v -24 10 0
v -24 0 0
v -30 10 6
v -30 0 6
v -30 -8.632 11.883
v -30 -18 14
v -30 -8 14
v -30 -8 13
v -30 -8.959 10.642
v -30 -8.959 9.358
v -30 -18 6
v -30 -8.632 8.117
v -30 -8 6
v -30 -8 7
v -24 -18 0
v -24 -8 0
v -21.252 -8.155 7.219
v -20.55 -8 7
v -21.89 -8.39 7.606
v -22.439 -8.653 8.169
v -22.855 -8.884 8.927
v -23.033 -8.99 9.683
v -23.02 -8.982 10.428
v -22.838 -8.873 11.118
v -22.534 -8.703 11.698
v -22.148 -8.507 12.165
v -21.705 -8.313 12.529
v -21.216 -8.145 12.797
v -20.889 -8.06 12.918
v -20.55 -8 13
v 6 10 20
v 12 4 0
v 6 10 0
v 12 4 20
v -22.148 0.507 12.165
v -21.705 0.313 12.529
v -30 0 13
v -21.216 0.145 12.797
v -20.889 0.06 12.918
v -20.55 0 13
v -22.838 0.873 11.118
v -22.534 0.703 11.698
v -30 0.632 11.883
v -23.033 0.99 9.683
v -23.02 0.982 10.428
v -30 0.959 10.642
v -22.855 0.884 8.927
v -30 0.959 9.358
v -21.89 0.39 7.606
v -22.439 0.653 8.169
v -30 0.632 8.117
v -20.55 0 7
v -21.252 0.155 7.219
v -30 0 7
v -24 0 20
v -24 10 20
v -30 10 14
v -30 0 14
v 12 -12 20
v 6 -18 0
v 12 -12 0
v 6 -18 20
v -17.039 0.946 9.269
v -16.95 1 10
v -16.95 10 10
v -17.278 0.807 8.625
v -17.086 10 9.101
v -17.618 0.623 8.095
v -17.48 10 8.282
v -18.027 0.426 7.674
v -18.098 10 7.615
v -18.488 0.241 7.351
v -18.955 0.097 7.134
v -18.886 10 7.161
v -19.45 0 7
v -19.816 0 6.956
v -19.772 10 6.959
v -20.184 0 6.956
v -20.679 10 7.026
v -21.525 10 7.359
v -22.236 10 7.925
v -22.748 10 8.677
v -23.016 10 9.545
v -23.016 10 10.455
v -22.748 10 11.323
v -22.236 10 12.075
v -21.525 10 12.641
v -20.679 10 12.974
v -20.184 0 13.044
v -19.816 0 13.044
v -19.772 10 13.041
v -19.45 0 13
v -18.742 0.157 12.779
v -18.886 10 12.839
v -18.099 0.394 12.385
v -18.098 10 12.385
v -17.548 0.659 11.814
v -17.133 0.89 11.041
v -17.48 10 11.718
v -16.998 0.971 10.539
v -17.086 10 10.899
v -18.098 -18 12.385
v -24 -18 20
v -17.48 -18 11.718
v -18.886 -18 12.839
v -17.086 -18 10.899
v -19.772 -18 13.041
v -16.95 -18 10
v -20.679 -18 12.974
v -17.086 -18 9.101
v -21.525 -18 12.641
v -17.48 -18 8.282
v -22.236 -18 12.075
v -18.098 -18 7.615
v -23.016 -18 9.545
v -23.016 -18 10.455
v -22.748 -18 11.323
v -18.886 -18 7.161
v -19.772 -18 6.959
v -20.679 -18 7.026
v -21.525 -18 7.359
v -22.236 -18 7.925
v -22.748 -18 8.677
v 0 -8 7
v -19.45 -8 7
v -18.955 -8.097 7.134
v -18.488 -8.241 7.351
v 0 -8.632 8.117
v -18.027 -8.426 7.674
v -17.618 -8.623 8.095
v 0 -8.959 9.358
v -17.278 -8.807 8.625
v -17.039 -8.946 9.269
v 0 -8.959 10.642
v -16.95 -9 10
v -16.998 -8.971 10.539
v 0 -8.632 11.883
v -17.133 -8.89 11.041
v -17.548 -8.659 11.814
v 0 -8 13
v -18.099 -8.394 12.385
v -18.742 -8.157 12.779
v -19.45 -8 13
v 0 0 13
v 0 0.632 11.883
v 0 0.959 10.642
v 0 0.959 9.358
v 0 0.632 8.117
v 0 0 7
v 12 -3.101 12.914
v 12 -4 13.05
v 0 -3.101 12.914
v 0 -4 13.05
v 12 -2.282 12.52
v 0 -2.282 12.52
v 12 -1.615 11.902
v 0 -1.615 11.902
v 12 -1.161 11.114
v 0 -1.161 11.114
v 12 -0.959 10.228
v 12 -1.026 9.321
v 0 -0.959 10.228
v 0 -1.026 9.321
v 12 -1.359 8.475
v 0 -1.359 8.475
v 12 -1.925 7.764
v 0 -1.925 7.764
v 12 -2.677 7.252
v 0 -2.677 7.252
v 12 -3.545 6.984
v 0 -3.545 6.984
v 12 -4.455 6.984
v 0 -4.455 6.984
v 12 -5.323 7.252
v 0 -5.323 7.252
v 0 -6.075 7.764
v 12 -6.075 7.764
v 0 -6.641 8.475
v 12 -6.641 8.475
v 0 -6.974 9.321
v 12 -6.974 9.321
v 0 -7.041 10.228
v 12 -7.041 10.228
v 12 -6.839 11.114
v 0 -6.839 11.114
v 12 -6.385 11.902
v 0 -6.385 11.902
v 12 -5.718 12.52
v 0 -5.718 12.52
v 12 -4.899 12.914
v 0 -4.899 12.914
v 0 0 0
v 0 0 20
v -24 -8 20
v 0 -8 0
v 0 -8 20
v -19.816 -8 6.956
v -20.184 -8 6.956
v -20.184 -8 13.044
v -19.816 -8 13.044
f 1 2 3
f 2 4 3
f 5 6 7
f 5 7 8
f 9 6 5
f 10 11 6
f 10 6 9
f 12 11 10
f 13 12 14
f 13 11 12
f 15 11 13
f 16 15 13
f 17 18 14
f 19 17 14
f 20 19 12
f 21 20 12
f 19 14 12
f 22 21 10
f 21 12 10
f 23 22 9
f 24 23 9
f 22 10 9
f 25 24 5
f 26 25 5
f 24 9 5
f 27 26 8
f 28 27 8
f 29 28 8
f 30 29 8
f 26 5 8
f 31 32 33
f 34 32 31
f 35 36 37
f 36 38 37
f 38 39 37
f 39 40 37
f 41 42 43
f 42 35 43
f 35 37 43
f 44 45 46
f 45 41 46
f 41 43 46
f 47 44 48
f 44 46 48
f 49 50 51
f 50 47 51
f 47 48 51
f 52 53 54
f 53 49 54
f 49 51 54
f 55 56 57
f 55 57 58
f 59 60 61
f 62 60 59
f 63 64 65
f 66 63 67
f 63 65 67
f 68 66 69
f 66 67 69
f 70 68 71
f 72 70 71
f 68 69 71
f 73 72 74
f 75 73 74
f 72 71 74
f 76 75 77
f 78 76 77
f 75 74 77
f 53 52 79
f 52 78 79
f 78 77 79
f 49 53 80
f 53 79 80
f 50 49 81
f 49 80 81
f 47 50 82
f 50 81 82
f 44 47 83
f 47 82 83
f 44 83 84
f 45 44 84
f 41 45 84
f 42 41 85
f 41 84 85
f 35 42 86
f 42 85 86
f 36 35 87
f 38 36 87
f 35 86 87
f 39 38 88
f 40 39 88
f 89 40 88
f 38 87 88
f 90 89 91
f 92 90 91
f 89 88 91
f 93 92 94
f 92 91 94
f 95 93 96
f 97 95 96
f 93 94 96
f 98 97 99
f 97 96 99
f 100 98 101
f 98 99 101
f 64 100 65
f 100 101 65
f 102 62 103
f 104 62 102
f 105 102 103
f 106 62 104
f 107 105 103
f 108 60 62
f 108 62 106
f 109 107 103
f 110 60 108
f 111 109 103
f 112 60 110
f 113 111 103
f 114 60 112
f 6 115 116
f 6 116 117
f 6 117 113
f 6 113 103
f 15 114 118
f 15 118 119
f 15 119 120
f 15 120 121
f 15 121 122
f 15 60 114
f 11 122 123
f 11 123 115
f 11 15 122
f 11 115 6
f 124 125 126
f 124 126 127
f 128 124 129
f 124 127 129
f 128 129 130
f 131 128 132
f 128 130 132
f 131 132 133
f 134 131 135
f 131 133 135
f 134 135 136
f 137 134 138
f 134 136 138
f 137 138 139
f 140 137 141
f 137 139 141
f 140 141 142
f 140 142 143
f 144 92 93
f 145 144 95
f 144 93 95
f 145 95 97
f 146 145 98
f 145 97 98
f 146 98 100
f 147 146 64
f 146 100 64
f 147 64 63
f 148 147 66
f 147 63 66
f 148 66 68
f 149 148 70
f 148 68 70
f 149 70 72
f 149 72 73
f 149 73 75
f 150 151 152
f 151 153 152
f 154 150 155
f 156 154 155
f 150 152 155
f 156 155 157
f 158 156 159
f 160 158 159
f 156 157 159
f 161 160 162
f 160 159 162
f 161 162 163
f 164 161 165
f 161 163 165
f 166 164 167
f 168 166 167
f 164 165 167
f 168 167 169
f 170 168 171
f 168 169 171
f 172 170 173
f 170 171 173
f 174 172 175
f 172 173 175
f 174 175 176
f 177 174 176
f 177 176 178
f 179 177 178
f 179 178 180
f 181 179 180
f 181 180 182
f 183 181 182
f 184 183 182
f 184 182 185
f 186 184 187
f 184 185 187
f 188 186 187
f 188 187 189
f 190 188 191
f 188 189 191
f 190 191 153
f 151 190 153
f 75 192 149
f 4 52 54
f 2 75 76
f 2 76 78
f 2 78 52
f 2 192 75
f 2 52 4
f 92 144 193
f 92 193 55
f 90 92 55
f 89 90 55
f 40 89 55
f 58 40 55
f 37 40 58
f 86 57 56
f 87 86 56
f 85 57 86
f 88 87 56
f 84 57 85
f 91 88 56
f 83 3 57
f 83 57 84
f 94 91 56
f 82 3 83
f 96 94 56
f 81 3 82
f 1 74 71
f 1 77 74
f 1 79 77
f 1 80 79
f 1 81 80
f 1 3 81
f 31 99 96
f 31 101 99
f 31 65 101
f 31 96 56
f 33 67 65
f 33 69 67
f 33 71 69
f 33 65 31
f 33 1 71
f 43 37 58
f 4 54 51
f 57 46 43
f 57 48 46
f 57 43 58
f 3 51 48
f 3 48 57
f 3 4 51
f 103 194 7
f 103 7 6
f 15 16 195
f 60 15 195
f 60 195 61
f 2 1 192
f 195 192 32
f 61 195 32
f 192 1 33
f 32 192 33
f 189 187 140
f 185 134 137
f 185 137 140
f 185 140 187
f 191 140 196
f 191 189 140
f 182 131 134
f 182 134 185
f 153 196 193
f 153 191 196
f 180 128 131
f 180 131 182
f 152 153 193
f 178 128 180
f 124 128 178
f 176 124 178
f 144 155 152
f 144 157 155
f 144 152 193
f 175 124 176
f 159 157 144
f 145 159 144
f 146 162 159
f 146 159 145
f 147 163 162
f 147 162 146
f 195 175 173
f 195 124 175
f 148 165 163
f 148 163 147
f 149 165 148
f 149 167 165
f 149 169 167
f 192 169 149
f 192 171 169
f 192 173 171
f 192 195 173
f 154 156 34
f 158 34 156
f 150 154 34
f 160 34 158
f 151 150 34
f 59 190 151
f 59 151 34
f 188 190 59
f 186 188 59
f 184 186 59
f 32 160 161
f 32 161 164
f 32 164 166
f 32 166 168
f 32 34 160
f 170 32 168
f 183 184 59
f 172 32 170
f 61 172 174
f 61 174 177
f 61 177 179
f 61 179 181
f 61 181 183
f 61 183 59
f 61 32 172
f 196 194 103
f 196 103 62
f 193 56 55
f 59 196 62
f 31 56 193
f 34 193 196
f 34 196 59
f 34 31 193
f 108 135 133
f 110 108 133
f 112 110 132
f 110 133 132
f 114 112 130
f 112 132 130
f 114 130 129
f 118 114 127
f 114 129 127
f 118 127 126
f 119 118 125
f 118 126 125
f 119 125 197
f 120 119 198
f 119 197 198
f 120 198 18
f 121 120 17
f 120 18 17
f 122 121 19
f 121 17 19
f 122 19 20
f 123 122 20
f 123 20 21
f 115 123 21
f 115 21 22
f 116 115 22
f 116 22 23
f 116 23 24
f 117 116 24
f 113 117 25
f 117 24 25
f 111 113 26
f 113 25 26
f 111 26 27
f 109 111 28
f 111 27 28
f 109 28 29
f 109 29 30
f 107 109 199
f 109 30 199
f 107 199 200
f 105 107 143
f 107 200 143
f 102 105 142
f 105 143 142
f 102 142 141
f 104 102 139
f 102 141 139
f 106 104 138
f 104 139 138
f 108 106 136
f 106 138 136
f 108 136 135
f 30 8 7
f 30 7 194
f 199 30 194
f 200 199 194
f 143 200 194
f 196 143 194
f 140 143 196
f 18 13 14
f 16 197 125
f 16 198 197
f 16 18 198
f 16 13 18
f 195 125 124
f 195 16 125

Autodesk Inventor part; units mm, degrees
ref_plane "YZ Plane" through (0, 0, 0) normal (1, 0, 0) x (0, 1, 0)
ref_plane "XZ Plane" through (0, 0, 0) normal (0, 1, 0) x (-1, 0, 0)
ref_plane "XY Plane" through (0, 0, 0) normal (0, 0, 1) x (1, 0, 0)
sketch "Sketch1" plane through (0, 0, 0) normal (0, 0, 1) x (1, 0, 0)
  line L0 (0, 0) -> (-30, 0)
  line L1 (-30, 0) -> (-30, 10)
  line L2 (-30, 10) -> (0, 10)
  line L3 (0, 10) -> (0, 0)
  line L4 (0, 10) -> (12, 10)
  line L5 (12, 10) -> (12, -18)
  line L6 (12, -18) -> (0, -18)
  line L7 (0, -18) -> (0, 10)
  line L8 (0, -18) -> (-30, -18)
  line L9 (-30, -18) -> (-30, -8)
  line L10 (-30, -8) -> (0, -8)
  line L11 (0, -8) -> (0, -18)
  dimension "d0" = 8
  dimension "d1" = 10
  dimension "d2" = 10
  dimension "d3" = 12
  dimension "d4" = 30
extrude "Extrusion1" add sketch "Sketch1" along normal blind 20
sketch "Sketch2" plane through (0, -8, 0) normal (-1, 0, 0) x (0, 0, 1)
  line L0 (20, 8) -> (20, 0) projected
  line L1 (0, 8) -> (0, 0) projected
  line L2 (0, 4) -> (20, 4) construction
  circle A0 centre (10, 4) radius 3.05
  dimension "d7" = 6.1
extrude "Extrusion2" cut sketch "Sketch2" against normal through all
sketch "Sketch3" plane through (-30, 10, 0) normal (0, 1, 0) x (1, 0, 0)
  line L0 (30, 0) -> (30, -20) projected
  line L1 (30, -10) -> (10, -10) construction
  circle A0 centre (10, -10) radius 3.05
  circle A1 centre (10, -10) radius 8.5 construction
  line L2 (42, 0) -> (42, -20) projected
  dimension "d10" = 17
  dimension "d11" = 6.1
  dimension "d12" = 20
  dimension "d24" = 11.5
  dimension "d25" = 32
extrude "Extrusion3" cut sketch "Sketch3" against normal through all
sketch "Sketch4" plane through (-30, 0, 0) normal (-1, 0, 0) x (0, 0, 1)
  circle A0 centre (10, -4) radius 3.05 projected
  circle A1 centre (10, -4) radius 5
  dimension "d15" = 10
extrude "Extrusion4" cut sketch "Sketch4" against normal up to surface (30 mm away)
chamfer "Chamfer1" distance 6 angle 45 4 edges at (-30, 5, 0) (-30, 5, 20) (-30, -13, 0) (-30, -13, 20)
chamfer "Chamfer2" distance 6 angle 45 2 edges at (12, 10, 10) (12, -18, 10)
properties part number "cross head"
